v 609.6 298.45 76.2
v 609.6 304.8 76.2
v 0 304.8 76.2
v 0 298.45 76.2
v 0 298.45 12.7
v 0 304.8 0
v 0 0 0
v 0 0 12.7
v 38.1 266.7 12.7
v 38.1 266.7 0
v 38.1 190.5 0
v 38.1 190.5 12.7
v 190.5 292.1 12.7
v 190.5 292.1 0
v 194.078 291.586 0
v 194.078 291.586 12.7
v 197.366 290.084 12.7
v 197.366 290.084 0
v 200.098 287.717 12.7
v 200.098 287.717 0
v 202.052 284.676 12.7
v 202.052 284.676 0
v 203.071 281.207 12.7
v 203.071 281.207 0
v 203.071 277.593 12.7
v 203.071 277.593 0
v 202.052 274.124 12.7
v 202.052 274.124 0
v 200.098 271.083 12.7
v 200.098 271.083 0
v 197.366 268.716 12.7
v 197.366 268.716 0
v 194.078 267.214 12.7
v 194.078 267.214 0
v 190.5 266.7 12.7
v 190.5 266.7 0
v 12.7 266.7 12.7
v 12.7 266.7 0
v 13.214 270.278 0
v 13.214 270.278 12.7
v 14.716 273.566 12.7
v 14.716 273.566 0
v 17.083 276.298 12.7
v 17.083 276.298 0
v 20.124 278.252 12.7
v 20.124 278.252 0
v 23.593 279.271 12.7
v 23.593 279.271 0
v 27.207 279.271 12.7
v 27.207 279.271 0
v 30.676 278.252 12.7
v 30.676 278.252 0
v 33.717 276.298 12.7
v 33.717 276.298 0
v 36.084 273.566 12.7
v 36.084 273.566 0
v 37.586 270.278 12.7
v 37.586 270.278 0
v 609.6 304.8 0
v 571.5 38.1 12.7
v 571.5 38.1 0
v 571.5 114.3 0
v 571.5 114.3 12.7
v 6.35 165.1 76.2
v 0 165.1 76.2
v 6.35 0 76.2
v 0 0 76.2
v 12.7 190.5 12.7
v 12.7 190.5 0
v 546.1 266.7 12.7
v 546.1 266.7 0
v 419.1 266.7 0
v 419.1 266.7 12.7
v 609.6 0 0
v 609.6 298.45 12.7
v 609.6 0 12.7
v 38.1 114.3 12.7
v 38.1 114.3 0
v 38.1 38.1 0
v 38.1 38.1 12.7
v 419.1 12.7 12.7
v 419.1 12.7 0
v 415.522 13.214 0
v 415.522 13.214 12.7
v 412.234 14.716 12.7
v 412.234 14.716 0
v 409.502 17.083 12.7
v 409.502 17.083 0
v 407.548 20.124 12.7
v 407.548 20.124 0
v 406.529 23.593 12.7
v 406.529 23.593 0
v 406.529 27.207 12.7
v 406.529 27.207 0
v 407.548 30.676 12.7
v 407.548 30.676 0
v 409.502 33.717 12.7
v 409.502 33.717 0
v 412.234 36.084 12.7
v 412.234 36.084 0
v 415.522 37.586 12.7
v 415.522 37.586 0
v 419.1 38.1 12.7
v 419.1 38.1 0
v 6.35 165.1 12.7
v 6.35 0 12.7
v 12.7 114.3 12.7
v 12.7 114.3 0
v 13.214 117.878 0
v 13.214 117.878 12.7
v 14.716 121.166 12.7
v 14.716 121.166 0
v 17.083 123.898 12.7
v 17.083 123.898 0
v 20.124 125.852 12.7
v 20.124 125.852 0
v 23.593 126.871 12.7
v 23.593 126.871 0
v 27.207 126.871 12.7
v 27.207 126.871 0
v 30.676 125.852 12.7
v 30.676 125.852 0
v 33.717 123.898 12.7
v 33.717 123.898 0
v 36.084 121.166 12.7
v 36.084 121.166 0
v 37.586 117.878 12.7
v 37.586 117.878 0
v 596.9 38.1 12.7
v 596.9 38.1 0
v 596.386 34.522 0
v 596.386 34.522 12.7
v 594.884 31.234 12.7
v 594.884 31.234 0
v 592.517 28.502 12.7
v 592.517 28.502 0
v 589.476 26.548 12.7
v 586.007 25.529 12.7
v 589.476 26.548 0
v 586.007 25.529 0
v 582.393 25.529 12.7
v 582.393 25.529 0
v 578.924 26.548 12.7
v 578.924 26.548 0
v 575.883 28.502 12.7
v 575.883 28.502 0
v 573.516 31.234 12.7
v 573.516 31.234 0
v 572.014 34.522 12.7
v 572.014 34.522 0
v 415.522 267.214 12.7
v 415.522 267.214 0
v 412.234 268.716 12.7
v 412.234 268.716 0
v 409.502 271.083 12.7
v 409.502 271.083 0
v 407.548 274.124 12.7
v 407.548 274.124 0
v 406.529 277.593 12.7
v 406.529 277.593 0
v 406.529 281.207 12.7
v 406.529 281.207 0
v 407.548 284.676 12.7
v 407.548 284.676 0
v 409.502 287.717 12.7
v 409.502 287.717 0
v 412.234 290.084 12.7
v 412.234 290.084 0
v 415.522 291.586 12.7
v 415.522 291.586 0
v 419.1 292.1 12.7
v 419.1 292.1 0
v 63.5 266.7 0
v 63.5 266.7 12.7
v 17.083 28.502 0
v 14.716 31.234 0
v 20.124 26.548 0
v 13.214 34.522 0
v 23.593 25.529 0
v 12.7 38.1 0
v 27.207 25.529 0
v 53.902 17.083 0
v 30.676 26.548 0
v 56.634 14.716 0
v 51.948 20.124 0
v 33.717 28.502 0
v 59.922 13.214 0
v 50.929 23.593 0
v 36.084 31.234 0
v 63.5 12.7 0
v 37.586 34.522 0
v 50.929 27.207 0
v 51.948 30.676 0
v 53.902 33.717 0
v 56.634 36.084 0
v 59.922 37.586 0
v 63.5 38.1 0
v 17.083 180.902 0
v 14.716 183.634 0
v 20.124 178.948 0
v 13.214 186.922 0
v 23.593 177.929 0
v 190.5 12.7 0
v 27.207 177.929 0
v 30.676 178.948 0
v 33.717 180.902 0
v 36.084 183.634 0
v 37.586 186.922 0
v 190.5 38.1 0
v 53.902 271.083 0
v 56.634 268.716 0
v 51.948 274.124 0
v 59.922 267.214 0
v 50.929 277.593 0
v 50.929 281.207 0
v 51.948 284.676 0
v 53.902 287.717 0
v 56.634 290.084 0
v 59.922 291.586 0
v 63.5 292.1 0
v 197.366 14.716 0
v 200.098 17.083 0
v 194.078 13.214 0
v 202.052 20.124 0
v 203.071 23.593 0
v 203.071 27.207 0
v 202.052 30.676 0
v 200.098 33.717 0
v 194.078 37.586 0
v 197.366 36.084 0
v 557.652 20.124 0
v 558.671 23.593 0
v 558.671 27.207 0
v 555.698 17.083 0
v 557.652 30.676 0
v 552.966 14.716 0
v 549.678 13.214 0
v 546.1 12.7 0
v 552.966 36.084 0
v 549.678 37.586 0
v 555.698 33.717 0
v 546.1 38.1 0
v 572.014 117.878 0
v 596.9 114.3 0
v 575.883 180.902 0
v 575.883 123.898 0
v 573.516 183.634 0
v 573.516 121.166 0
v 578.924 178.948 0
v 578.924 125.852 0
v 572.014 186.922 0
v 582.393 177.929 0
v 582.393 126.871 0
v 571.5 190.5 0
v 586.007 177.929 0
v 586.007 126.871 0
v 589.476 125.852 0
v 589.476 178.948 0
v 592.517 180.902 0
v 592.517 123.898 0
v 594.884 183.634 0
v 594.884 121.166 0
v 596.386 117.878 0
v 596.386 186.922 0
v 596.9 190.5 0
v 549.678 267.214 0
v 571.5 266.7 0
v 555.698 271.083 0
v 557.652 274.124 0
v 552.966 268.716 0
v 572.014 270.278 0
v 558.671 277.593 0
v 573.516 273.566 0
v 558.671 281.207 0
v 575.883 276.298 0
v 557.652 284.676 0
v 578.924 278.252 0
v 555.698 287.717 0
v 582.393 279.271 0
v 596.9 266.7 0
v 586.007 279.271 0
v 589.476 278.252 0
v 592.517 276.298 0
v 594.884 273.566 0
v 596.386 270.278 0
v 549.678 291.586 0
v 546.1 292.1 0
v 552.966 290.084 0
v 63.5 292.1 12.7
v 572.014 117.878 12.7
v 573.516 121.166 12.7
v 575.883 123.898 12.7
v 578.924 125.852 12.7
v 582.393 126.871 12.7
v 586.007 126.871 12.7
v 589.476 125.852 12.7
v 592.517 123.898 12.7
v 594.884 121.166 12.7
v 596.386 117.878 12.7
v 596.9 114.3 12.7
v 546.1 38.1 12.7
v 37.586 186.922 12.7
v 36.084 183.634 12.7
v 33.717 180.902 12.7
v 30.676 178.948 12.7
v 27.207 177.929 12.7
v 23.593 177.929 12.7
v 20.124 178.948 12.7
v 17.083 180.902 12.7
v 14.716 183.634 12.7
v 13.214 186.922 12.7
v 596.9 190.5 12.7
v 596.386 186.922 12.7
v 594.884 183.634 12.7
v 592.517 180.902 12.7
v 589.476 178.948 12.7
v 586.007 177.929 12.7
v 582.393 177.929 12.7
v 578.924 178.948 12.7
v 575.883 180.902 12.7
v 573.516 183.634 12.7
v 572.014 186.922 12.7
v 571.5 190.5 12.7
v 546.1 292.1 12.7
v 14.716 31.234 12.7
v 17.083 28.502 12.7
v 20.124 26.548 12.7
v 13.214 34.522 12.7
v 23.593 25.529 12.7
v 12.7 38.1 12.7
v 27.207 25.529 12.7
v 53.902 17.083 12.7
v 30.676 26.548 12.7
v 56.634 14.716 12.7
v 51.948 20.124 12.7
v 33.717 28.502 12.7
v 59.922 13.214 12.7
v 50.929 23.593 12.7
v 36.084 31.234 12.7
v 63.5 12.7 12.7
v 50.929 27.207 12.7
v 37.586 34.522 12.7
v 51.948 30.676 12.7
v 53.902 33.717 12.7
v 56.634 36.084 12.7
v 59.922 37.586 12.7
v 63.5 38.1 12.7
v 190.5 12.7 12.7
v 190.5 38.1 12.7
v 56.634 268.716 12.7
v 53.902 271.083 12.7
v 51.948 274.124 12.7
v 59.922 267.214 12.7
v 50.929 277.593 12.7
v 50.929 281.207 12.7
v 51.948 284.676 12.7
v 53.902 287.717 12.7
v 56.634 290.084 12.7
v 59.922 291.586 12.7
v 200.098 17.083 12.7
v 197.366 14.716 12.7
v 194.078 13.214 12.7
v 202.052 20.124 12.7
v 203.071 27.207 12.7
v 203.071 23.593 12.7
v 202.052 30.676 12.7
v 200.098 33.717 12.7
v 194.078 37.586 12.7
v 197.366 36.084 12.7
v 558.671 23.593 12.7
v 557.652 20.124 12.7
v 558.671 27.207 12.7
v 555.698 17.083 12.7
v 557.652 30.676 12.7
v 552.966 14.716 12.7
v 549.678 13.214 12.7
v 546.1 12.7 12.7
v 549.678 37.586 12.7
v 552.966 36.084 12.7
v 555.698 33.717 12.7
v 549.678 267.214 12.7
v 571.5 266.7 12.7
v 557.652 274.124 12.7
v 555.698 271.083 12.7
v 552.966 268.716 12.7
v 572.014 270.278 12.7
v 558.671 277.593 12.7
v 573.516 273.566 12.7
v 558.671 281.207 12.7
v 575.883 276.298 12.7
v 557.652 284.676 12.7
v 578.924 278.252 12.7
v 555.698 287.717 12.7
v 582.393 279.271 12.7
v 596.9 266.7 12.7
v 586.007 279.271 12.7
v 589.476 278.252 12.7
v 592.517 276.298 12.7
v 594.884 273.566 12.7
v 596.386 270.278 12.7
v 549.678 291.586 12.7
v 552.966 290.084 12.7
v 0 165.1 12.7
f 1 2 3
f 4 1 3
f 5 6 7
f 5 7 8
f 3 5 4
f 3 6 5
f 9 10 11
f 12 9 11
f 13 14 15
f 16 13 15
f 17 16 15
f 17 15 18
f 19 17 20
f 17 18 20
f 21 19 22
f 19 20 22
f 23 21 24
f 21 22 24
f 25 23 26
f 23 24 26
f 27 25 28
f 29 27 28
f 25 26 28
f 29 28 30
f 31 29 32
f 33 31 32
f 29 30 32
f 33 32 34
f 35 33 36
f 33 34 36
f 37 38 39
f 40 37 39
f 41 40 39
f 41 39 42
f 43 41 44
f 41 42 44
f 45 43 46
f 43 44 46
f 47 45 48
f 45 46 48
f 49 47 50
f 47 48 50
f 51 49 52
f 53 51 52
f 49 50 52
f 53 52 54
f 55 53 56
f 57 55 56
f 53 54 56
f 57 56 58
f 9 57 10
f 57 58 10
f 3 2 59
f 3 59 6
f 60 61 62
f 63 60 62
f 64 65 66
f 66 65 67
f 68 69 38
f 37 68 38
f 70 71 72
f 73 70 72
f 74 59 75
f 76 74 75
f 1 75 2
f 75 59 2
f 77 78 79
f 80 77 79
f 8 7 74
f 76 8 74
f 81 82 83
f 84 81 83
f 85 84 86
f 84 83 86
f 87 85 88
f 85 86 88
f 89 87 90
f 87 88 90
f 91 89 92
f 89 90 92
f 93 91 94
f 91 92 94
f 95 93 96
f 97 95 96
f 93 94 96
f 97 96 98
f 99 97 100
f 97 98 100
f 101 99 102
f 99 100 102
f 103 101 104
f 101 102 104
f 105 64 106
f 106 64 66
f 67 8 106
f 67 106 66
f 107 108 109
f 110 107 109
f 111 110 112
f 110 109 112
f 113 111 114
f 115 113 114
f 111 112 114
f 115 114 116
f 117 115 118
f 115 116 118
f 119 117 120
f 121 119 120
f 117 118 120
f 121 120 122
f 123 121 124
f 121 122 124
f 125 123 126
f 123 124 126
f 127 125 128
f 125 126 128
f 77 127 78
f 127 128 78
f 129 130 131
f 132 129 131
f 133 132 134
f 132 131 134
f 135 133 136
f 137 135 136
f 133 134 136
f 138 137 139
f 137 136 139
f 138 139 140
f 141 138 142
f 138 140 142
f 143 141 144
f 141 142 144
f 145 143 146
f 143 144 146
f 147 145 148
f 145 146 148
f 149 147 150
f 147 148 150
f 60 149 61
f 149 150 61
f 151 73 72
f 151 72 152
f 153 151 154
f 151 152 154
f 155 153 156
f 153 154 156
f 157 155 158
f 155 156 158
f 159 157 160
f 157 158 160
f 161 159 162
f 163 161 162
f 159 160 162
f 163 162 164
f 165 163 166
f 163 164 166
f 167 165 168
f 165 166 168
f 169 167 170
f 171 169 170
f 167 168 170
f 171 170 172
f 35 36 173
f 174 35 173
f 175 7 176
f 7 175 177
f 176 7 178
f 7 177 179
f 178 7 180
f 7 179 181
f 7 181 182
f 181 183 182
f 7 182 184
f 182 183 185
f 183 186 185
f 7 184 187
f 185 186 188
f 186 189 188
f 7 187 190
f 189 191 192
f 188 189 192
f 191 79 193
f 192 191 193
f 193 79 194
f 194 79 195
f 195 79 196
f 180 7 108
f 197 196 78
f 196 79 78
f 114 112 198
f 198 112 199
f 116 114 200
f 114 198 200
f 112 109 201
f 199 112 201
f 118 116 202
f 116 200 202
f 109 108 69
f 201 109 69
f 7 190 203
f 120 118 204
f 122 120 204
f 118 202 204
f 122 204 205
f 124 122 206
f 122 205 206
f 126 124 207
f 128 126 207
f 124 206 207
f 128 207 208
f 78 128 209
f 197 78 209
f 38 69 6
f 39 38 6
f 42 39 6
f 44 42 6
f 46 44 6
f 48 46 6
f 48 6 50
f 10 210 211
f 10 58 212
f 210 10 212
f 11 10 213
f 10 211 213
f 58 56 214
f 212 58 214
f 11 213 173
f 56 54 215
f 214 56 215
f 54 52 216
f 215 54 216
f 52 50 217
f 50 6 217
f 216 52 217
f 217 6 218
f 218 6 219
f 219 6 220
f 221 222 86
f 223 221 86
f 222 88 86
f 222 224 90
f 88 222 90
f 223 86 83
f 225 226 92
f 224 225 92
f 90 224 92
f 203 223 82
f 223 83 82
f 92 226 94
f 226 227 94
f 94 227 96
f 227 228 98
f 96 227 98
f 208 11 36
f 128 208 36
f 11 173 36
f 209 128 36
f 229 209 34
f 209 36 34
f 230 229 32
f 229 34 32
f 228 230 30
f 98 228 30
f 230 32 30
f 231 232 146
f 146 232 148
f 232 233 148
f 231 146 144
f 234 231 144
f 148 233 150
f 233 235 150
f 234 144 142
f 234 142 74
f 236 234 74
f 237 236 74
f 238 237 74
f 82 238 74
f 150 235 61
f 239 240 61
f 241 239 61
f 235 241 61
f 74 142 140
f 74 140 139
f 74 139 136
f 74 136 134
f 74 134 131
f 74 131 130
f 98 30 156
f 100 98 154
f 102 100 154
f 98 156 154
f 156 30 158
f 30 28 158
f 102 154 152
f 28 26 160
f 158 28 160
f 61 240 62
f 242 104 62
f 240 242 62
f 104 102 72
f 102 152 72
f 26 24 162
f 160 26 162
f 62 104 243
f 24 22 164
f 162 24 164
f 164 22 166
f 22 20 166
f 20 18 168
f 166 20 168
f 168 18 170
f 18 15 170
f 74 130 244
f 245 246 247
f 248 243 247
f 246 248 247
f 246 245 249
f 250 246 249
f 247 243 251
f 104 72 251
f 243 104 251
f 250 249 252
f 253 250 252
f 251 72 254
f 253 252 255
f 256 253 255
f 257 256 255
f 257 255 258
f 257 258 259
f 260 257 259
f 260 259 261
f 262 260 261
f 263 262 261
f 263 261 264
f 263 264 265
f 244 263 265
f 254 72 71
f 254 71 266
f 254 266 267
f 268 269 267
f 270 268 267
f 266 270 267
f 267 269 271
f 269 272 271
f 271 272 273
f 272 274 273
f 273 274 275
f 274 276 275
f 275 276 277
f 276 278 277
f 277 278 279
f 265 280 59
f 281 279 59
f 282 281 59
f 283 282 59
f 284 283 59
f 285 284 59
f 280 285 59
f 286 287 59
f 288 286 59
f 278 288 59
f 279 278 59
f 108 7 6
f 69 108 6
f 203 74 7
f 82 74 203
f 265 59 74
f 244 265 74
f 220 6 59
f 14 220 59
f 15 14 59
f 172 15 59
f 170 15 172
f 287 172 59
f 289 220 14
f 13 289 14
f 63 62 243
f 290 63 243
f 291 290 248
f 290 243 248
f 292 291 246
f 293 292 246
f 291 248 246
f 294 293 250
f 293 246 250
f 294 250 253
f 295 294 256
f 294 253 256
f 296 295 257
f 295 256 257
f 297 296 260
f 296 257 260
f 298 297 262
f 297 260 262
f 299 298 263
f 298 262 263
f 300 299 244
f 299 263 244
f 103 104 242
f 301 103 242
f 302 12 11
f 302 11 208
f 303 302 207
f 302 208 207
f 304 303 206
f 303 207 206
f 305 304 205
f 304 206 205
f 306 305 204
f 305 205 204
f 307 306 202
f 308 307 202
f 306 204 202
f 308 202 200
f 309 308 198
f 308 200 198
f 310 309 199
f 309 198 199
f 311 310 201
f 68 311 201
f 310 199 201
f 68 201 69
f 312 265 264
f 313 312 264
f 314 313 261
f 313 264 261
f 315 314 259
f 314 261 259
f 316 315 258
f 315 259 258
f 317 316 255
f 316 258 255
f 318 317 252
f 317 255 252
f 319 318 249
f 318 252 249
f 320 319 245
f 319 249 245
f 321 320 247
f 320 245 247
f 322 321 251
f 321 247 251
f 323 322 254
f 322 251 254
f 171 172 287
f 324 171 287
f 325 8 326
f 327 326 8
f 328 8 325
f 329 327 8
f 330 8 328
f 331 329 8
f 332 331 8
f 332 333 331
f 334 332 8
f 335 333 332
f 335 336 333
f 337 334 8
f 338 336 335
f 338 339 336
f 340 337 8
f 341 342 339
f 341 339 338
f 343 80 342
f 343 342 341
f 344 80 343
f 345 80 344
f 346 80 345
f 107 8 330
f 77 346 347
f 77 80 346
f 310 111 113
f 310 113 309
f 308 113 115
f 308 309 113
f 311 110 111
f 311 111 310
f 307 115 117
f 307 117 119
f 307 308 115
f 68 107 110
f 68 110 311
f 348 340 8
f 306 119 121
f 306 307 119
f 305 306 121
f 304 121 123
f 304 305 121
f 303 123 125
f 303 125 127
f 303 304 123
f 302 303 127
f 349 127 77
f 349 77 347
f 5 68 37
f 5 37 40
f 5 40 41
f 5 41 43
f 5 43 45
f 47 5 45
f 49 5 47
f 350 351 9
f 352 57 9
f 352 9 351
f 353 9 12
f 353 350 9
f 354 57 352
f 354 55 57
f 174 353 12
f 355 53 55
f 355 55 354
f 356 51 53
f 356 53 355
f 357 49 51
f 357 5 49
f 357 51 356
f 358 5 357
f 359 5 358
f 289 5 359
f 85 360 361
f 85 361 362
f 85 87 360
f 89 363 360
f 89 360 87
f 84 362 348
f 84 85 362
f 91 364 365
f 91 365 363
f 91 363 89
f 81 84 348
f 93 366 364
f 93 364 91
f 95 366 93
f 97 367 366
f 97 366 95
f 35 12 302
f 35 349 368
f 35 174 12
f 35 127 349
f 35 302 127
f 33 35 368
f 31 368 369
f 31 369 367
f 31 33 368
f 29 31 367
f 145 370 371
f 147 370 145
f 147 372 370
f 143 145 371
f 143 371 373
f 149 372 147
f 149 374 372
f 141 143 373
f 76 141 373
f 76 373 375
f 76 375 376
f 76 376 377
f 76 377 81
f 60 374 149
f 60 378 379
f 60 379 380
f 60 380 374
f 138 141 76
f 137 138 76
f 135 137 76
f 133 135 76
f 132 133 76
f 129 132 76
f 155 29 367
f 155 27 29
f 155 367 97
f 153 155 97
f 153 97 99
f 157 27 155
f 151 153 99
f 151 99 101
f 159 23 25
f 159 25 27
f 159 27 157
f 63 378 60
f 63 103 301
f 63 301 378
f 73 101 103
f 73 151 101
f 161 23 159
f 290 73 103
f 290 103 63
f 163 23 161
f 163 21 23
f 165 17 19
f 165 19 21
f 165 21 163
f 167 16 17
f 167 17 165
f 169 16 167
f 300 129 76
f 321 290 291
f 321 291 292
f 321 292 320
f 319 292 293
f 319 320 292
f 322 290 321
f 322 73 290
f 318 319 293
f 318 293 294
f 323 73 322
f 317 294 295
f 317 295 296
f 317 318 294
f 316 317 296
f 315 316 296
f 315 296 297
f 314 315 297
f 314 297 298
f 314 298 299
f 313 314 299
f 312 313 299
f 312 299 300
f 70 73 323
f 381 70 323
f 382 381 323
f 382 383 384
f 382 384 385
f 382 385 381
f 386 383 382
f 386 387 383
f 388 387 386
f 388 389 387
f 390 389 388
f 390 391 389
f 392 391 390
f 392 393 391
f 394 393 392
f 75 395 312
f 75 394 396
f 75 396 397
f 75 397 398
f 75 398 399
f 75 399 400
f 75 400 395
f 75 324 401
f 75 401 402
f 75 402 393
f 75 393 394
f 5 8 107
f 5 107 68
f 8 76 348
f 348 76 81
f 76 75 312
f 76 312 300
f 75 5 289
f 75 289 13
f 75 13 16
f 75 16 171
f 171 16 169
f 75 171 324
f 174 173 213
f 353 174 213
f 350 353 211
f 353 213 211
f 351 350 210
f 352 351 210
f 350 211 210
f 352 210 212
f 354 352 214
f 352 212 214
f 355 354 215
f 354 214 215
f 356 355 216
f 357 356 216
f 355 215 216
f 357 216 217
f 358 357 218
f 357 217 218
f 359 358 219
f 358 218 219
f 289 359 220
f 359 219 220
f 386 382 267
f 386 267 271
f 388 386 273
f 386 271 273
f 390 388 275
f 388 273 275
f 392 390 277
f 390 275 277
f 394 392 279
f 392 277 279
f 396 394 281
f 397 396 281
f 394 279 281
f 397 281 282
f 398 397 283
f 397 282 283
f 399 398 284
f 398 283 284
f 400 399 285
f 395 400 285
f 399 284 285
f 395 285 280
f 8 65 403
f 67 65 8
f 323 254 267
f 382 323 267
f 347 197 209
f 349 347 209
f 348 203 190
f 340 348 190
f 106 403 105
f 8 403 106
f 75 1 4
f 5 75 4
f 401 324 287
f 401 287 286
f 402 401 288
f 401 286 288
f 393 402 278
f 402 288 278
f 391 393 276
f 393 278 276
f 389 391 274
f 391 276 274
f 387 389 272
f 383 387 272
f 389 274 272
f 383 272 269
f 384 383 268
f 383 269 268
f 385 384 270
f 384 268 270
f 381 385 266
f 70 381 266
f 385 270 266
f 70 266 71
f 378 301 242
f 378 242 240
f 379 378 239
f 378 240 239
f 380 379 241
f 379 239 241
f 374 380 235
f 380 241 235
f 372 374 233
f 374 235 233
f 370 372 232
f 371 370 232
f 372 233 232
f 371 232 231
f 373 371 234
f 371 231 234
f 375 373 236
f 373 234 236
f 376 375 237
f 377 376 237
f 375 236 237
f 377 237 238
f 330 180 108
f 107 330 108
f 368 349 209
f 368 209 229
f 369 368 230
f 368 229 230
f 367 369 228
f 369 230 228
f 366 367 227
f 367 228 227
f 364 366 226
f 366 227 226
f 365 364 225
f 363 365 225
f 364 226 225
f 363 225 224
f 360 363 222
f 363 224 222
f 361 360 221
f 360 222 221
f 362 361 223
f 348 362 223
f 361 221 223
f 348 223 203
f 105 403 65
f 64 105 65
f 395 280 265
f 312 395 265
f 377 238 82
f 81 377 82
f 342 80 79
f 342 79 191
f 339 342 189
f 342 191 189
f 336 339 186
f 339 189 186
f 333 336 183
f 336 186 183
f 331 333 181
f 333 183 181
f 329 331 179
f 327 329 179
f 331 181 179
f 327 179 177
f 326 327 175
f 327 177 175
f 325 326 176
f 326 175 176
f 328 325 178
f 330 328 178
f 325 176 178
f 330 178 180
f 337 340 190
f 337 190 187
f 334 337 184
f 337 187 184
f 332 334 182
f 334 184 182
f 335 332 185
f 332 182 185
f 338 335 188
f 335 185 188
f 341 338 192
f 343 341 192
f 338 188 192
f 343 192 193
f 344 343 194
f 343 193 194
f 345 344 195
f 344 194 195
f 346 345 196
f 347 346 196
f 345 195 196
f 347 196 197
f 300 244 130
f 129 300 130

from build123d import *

# Parameters (mm, degrees)
F0_W     = 609.6
F0_H     = 304.8
F1_DEPTH = 12.7
F2_W     = 609.6
F2_H     = 63.5
F3_DEPTH = 6.35
F4_W     = 165.1
F4_H     = 63.5
F5_DEPTH = 6.35


with BuildPart() as f1:
    # F0 (on Top) → F1 (new body)
    with BuildSketch(Plane.XY):
        with Locations((304.8, 152.4)):
            Rectangle(F0_W, F0_H)
        with BuildLine():
            ThreePointArc((190.5, 38.1), (203.2, 25.4), (190.5, 12.7))
            Line((190.5, 12.7), (63.5, 12.7))
            ThreePointArc((63.5, 12.7), (50.8, 25.4), (63.5, 38.1))
            Line((63.5, 38.1), (190.5, 38.1))
        make_face(mode=Mode.SUBTRACT)
        with BuildLine():
            ThreePointArc((38.1, 38.1), (25.4, 25.4), (12.7, 38.1))
            Line((12.7, 38.1), (12.7, 114.3))
            ThreePointArc((12.7, 114.3), (25.4, 127), (38.1, 114.3))
            Line((38.1, 114.3), (38.1, 38.1))
        make_face(mode=Mode.SUBTRACT)
        with BuildLine():
            ThreePointArc((546.1, 38.1), (558.8, 25.4), (546.1, 12.7))
            Line((546.1, 12.7), (419.1, 12.7))
            ThreePointArc((419.1, 12.7), (406.4, 25.4), (419.1, 38.1))
            Line((419.1, 38.1), (546.1, 38.1))
        make_face(mode=Mode.SUBTRACT)
        with BuildLine():
            ThreePointArc((596.9, 38.1), (584.2, 25.4), (571.5, 38.1))
            Line((571.5, 38.1), (571.5, 114.3))
            ThreePointArc((571.5, 114.3), (584.2, 127), (596.9, 114.3))
            Line((596.9, 114.3), (596.9, 38.1))
        make_face(mode=Mode.SUBTRACT)
        with BuildLine():
            ThreePointArc((38.1, 190.5), (25.4, 177.8), (12.7, 190.5))
            Line((12.7, 190.5), (12.7, 266.7))
            ThreePointArc((12.7, 266.7), (25.4, 279.4), (38.1, 266.7))
            Line((38.1, 266.7), (38.1, 190.5))
        make_face(mode=Mode.SUBTRACT)
        with BuildLine():
            ThreePointArc((190.5, 292.1), (203.2, 279.4), (190.5, 266.7))
            Line((190.5, 266.7), (63.5, 266.7))
            ThreePointArc((63.5, 266.7), (50.8, 279.4), (63.5, 292.1))
            Line((63.5, 292.1), (190.5, 292.1))
        make_face(mode=Mode.SUBTRACT)
        with BuildLine():
            ThreePointArc((596.9, 190.5), (584.2, 177.8), (571.5, 190.5))
            Line((571.5, 190.5), (571.5, 266.7))
            ThreePointArc((571.5, 266.7), (584.2, 279.4), (596.9, 266.7))
            Line((596.9, 266.7), (596.9, 190.5))
        make_face(mode=Mode.SUBTRACT)
        with BuildLine():
            ThreePointArc((546.1, 292.1), (558.8, 279.4), (546.1, 266.7))
            Line((546.1, 266.7), (419.1, 266.7))
            ThreePointArc((419.1, 266.7), (406.4, 279.4), (419.1, 292.1))
            Line((419.1, 292.1), (546.1, 292.1))
        make_face(mode=Mode.SUBTRACT)
    extrude(amount=F1_DEPTH)

    # F2 (on face) → F3 (join)
    with BuildSketch(Plane(origin=(0, 304.8, 0), x_dir=(-1, 0, 0), z_dir=(0, 1, 0))):
        with Locations((-304.8, 44.45)):
            Rectangle(F2_W, F2_H)
    extrude(amount=-F3_DEPTH)


with BuildPart() as f5:
    # F4 (on face) → F5 (new body)
    with BuildSketch(Plane(origin=(0, 0, 0), x_dir=(0, -1, 0), z_dir=(-1, 0, 0))):
        with Locations((-82.55, 44.45)):
            Rectangle(F4_W, F4_H)
    extrude(amount=-F5_DEPTH)


solid = Compound([f1.part, f5.part])
